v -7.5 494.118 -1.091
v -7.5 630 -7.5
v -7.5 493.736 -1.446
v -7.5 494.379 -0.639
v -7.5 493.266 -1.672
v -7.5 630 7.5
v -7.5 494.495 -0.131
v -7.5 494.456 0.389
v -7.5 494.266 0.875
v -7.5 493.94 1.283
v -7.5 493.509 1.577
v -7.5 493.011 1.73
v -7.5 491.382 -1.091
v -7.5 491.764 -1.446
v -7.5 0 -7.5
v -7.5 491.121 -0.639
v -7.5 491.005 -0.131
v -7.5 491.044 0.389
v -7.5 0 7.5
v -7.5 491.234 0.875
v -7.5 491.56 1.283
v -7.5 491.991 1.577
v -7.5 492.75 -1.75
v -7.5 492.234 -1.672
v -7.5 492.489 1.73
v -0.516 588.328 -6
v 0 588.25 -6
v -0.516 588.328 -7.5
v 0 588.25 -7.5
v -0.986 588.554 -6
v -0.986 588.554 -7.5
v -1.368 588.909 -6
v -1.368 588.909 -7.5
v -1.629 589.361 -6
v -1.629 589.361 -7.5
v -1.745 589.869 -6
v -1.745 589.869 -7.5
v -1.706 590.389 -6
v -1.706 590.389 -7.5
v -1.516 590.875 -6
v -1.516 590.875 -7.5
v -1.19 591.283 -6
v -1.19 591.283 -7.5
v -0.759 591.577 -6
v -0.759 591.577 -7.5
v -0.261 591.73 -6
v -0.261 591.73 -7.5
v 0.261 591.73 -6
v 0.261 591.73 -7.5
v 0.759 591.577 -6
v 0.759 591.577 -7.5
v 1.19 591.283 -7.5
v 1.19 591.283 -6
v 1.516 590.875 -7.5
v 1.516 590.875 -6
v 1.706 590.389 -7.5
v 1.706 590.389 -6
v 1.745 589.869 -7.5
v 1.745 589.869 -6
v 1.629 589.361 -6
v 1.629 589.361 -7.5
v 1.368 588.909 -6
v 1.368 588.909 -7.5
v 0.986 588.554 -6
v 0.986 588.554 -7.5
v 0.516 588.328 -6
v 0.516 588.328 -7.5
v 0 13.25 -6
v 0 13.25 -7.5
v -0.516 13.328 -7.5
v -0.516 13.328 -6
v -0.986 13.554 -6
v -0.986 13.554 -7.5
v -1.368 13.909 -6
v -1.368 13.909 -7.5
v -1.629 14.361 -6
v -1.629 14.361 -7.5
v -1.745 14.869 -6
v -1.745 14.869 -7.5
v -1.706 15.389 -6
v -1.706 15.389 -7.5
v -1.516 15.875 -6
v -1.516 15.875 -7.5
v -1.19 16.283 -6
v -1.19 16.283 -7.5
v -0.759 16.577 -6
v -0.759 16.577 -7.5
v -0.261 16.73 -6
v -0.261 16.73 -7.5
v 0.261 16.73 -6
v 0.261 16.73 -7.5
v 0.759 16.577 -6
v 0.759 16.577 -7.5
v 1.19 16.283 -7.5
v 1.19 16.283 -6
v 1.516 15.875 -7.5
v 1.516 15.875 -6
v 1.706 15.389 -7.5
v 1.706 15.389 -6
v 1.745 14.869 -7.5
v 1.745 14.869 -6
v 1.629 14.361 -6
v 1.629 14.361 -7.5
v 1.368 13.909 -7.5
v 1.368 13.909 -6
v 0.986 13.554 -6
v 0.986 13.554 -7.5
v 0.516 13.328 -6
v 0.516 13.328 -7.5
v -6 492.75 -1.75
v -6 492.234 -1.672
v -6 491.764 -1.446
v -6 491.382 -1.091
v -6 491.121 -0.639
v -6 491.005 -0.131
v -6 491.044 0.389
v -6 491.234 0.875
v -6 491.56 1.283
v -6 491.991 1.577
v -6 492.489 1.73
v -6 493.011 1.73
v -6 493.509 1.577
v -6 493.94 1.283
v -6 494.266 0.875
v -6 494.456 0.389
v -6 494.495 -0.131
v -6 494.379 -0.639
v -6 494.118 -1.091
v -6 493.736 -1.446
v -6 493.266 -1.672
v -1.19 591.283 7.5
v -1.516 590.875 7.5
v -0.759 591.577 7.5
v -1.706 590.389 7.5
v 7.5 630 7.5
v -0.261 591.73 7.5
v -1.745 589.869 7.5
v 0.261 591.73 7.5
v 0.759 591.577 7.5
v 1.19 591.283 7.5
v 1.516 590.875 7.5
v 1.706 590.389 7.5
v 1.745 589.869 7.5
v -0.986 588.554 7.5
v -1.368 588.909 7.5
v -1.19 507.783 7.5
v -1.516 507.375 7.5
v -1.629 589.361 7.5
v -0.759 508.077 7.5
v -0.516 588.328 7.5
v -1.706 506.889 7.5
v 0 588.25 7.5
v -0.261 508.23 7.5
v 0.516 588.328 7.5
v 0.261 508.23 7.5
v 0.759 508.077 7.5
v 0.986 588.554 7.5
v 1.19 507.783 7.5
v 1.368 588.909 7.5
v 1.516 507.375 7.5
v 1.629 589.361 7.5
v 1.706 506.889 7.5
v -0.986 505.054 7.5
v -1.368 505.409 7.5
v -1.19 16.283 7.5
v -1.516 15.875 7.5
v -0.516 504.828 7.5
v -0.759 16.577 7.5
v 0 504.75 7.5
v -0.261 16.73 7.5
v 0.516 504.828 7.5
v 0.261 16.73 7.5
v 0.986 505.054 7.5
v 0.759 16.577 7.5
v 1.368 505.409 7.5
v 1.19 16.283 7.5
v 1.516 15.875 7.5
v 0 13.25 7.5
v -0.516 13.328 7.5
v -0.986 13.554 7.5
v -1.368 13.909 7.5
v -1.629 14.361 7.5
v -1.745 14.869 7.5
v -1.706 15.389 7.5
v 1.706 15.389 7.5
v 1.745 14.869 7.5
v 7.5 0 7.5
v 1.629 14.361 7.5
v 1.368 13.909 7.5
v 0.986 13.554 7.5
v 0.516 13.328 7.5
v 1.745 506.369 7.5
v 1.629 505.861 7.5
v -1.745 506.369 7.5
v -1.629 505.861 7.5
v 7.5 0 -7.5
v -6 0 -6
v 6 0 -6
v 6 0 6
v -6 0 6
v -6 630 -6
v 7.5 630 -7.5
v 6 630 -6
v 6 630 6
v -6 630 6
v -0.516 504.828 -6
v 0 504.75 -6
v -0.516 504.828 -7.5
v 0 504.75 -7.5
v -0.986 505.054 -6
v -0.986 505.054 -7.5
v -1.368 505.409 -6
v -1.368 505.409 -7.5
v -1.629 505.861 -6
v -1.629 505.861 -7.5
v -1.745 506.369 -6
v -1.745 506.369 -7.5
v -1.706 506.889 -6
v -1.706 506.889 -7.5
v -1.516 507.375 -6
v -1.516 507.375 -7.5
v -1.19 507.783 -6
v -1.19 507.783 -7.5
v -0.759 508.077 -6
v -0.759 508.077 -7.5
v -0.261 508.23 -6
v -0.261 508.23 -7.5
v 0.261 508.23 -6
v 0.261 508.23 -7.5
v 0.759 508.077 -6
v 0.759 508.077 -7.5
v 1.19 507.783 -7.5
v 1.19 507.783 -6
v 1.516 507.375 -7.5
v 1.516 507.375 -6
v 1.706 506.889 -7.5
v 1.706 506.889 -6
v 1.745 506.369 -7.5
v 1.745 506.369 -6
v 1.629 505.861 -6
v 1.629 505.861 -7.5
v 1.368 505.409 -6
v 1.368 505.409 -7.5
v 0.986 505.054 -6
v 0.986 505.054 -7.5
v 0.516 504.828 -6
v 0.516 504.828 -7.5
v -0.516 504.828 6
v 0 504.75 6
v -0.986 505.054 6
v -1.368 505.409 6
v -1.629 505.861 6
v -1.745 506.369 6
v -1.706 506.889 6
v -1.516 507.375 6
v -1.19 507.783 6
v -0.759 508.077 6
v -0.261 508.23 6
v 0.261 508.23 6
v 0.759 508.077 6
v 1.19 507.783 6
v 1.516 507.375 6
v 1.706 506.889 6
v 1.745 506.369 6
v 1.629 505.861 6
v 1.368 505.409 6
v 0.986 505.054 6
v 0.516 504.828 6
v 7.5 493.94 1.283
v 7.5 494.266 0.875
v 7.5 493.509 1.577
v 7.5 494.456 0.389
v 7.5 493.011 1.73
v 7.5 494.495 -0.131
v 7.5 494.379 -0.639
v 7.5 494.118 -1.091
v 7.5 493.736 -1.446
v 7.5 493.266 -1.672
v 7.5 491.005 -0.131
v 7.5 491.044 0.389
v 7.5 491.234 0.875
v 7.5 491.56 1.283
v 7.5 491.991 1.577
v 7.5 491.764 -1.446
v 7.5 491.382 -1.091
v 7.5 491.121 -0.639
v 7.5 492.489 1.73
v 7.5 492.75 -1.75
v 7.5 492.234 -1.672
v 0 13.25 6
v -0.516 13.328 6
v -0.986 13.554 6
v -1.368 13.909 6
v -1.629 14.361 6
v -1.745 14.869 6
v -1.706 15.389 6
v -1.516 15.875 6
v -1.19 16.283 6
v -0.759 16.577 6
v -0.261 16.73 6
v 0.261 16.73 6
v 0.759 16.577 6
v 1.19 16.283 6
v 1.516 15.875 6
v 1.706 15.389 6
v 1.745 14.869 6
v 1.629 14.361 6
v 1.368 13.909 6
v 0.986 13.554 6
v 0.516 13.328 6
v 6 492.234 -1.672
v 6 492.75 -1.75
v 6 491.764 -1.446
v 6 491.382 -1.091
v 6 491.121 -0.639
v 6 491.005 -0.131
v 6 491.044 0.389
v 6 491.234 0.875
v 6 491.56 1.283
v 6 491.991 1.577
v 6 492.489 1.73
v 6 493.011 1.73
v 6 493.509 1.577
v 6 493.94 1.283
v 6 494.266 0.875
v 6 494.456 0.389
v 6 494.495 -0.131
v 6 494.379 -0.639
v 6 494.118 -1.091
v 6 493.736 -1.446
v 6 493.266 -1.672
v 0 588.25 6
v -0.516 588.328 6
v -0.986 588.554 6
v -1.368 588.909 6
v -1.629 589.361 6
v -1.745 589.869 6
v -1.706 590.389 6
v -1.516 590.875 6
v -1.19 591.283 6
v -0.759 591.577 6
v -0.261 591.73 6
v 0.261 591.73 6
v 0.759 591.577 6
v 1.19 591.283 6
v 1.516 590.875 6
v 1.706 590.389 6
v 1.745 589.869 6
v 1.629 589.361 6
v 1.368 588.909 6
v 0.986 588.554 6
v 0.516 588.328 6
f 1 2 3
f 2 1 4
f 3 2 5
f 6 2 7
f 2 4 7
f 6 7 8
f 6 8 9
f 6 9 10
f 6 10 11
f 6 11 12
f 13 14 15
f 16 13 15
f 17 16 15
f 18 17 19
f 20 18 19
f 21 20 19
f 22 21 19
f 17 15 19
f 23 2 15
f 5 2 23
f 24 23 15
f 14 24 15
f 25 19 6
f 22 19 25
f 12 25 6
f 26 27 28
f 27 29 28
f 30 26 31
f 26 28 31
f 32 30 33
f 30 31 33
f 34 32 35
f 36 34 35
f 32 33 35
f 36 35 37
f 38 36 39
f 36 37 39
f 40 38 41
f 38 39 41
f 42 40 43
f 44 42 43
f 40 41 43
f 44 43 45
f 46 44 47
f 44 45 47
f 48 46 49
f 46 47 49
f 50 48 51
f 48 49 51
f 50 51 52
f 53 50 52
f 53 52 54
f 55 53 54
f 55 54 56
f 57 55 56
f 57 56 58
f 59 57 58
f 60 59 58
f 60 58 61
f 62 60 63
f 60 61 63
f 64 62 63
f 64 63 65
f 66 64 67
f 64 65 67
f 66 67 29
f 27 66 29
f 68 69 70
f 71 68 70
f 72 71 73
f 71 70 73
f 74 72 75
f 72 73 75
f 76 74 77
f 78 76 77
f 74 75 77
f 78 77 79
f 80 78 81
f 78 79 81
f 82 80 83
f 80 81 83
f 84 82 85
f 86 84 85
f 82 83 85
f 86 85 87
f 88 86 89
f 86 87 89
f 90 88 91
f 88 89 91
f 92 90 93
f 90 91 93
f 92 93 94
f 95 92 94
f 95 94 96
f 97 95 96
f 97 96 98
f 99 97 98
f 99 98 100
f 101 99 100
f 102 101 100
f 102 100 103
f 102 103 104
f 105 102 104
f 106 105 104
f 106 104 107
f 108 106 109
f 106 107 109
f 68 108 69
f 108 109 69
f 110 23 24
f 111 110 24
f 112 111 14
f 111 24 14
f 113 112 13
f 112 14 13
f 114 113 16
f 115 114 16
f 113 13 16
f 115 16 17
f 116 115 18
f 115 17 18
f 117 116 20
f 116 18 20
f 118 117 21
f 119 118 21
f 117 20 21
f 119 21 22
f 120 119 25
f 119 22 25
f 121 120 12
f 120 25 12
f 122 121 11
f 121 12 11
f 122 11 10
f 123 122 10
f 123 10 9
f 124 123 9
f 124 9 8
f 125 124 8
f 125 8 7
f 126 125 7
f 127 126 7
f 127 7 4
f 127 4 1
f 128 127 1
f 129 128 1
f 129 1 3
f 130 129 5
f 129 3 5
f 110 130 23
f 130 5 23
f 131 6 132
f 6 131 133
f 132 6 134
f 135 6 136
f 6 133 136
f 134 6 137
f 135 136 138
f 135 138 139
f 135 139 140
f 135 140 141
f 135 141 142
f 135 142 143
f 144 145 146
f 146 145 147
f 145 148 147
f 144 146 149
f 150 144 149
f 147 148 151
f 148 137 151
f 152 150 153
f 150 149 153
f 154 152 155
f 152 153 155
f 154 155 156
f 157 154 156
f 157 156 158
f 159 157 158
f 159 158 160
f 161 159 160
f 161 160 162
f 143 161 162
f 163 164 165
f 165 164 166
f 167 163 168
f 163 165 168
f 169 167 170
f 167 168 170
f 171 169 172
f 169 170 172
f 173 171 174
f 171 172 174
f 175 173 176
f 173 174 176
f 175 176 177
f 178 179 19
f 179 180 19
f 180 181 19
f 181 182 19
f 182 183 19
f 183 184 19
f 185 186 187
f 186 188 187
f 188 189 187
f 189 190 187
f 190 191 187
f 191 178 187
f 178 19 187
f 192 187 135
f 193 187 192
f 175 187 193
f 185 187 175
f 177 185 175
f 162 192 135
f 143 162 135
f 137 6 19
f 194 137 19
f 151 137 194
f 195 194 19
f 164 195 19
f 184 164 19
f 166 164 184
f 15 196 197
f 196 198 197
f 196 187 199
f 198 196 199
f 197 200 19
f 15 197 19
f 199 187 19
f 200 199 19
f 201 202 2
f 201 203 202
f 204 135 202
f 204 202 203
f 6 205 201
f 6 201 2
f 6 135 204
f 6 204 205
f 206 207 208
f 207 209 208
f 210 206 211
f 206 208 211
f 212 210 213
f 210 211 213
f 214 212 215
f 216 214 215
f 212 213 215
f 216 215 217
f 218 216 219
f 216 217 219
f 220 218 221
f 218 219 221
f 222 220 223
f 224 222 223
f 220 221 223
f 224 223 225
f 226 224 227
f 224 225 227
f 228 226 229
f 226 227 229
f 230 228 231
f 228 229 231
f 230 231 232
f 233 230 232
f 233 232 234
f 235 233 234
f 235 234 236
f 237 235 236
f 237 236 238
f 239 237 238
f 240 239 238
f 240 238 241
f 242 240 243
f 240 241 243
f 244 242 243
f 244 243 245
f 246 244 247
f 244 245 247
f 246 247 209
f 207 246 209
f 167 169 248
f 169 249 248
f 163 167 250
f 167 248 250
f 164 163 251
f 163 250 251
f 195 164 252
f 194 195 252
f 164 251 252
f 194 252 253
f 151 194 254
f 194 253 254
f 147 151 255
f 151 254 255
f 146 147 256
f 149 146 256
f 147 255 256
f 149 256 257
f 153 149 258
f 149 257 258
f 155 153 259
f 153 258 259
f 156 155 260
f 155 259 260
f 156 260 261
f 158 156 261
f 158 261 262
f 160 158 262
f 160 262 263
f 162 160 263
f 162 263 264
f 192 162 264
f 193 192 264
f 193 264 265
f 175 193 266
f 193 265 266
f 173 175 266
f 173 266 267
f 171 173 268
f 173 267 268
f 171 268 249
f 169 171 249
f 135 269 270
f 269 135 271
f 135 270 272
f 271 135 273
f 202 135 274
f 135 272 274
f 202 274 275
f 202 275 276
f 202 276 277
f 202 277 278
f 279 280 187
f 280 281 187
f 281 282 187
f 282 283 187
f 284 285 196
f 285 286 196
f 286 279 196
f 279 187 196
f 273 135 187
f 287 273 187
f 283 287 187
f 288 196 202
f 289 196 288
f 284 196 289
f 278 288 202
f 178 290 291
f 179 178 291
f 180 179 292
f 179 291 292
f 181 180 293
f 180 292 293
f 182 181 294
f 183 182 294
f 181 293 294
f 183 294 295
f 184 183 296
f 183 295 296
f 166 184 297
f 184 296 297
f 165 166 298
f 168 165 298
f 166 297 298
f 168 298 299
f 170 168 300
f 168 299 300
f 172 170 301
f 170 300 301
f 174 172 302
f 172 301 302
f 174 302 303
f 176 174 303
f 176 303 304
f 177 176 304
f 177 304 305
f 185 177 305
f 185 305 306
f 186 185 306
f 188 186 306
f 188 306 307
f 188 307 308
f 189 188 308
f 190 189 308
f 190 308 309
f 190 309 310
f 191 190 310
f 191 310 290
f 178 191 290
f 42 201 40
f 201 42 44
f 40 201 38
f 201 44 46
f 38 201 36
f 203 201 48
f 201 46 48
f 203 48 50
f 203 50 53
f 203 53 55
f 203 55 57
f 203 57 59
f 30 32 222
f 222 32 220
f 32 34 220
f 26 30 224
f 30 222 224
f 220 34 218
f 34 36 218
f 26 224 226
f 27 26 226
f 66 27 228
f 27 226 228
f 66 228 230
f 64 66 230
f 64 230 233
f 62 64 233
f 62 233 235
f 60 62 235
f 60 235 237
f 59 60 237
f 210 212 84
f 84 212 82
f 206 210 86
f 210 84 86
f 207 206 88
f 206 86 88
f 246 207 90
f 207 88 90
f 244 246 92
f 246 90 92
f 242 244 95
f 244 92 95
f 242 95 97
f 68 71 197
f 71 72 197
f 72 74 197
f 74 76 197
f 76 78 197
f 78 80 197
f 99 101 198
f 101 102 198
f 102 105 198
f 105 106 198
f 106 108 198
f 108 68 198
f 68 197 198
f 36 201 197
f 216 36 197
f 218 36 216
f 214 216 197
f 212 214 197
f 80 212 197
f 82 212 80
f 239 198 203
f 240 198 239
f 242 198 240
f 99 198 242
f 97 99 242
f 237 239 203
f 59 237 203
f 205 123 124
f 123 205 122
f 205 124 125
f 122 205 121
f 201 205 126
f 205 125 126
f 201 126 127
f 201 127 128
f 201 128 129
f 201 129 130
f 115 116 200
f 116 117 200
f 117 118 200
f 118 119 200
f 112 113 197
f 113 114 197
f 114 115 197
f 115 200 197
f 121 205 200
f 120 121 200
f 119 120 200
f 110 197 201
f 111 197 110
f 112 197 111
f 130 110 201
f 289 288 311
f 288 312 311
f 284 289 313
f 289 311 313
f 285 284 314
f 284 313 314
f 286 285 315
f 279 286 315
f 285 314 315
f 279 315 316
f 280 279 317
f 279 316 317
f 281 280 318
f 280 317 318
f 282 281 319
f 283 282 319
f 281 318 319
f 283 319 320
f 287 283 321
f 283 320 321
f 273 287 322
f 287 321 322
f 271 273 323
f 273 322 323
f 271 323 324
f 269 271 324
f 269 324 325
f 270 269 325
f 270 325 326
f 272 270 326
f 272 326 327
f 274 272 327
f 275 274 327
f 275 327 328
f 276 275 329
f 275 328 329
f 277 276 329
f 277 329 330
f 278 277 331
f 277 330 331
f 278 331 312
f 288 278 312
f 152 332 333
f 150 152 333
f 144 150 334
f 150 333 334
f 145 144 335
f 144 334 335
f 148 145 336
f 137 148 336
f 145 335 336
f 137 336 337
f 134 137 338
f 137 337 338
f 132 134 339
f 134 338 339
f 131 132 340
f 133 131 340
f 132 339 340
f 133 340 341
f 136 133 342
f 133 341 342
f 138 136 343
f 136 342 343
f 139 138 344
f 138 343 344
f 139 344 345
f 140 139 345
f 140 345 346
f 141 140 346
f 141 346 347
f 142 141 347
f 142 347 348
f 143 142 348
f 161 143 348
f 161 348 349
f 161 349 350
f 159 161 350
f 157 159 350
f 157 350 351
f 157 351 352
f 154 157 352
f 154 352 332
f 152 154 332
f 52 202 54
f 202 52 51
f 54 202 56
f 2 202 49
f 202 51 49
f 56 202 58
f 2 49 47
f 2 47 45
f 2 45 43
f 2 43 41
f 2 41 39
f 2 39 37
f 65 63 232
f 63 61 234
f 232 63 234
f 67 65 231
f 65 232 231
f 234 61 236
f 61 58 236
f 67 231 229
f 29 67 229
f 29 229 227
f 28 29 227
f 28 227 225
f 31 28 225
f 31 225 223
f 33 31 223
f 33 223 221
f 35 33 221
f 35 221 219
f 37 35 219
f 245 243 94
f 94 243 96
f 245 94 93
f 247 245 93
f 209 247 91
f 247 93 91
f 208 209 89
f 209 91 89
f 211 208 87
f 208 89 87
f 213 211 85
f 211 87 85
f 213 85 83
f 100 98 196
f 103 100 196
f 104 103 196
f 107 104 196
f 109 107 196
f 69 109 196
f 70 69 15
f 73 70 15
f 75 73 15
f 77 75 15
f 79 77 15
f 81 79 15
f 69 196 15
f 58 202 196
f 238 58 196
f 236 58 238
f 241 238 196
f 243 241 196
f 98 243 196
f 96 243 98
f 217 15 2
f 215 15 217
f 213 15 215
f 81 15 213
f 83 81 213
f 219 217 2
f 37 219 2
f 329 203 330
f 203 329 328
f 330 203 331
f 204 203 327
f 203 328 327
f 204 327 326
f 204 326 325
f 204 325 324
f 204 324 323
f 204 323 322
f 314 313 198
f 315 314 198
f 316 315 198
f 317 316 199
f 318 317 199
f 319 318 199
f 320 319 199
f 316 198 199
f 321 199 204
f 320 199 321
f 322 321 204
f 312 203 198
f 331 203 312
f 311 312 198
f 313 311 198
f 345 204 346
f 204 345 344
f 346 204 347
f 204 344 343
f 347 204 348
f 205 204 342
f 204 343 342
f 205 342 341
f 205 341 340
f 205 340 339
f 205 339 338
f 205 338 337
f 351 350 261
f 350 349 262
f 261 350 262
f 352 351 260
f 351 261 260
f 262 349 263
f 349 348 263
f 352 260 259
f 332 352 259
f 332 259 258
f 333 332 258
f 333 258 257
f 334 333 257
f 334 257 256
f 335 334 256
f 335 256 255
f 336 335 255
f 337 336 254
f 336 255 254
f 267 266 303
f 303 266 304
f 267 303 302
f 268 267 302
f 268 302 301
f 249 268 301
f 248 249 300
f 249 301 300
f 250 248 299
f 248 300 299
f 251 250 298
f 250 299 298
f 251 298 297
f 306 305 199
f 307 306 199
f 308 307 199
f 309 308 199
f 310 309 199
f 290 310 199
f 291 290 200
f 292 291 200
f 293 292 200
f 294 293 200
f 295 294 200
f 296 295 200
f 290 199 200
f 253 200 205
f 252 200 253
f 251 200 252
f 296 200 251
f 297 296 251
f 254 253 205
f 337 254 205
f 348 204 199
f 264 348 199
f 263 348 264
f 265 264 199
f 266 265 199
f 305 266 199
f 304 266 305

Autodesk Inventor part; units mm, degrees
ref_plane "YZ Plane" through (0, 0, 0) normal (1, 0, 0) x (0, 1, 0)
ref_plane "XZ Plane" through (0, 0, 0) normal (0, 1, 0) x (-1, 0, 0)
ref_plane "XY Plane" through (0, 0, 0) normal (0, 0, 1) x (1, 0, 0)
sketch "Szkic1" plane through (0, 0, 0) normal (0, 1, 0) x (-1, 0, 0)
  line L0 (-7.5, -7.5) -> (7.5, -7.5)
  line L1 (7.5, -7.5) -> (7.5, 7.5)
  line L2 (7.5, 7.5) -> (-7.5, 7.5)
  line L3 (-7.5, 7.5) -> (-7.5, -7.5)
  line L4 (-7.5, -7.5) -> (7.5, 7.5) construction
  line L5 (7.5, -7.5) -> (-7.5, 7.5) construction
  line L6 (6, -6) -> (-6, -6)
  line L7 (-6, -6) -> (-6, 6)
  line L8 (-6, 6) -> (6, 6)
  line L9 (6, 6) -> (6, -6)
  line L10 (6, -6) -> (-6, 6) construction
  line L11 (-6, -6) -> (6, 6) construction
  point P0 (0, 0)
  dimension "d0" = 15
  dimension "d1" = 15
  dimension "d2" = 12
  dimension "d3" = 12
extrude "Wyciągnięcie proste1" add sketch "Szkic1" along normal blind 630
sketch "Szkic2" plane through (-7.5, 0, 7.5) normal (0, 0, 1) x (1, 0, 0)
  line L0 (7.5, 0) -> (7.5, 15) construction
  dimension "d6" = 15
hole "Otwór1" at (0, 15, 7.5) direction (0, 0, -1) diameter 3.5 end through all
sketch "Szkic3" plane through (7.5, 0, 7.5) normal (1, 0, 0) x (0, 0, -1)
  line L0 (13.5, 630) -> (1.5, 630) construction
  line L1 (7.5, 630) -> (7.5, 492.75) construction
  point P0 (7.5, 0)
  dimension "d14" = 137.25
hole "Otwór2" at (7.5, 492.75, 0) direction (-1, 0, 0) diameter 3.5 end through all
sketch "Szkic4" plane through (-7.5, 0, 7.5) normal (0, 0, 1) x (1, 0, 0)
  line L0 (13.5, 630) -> (1.5, 630) construction
  line L1 (7.5, 630) -> (7.5, 590) construction
  line L2 (7.5, 630) -> (7.5, 506.5) construction
  point P0 (7.5, 0)
  dimension "d22" = 40
  dimension "d32" = 123.5
hole "Otwór3" at (0, 590, 7.5) at (0, 506.5, 7.5) direction (0, 0, -1) diameter 3.5 end through all
properties part number "bepf_glowny_wspornik" material "Aluminium 6061"
